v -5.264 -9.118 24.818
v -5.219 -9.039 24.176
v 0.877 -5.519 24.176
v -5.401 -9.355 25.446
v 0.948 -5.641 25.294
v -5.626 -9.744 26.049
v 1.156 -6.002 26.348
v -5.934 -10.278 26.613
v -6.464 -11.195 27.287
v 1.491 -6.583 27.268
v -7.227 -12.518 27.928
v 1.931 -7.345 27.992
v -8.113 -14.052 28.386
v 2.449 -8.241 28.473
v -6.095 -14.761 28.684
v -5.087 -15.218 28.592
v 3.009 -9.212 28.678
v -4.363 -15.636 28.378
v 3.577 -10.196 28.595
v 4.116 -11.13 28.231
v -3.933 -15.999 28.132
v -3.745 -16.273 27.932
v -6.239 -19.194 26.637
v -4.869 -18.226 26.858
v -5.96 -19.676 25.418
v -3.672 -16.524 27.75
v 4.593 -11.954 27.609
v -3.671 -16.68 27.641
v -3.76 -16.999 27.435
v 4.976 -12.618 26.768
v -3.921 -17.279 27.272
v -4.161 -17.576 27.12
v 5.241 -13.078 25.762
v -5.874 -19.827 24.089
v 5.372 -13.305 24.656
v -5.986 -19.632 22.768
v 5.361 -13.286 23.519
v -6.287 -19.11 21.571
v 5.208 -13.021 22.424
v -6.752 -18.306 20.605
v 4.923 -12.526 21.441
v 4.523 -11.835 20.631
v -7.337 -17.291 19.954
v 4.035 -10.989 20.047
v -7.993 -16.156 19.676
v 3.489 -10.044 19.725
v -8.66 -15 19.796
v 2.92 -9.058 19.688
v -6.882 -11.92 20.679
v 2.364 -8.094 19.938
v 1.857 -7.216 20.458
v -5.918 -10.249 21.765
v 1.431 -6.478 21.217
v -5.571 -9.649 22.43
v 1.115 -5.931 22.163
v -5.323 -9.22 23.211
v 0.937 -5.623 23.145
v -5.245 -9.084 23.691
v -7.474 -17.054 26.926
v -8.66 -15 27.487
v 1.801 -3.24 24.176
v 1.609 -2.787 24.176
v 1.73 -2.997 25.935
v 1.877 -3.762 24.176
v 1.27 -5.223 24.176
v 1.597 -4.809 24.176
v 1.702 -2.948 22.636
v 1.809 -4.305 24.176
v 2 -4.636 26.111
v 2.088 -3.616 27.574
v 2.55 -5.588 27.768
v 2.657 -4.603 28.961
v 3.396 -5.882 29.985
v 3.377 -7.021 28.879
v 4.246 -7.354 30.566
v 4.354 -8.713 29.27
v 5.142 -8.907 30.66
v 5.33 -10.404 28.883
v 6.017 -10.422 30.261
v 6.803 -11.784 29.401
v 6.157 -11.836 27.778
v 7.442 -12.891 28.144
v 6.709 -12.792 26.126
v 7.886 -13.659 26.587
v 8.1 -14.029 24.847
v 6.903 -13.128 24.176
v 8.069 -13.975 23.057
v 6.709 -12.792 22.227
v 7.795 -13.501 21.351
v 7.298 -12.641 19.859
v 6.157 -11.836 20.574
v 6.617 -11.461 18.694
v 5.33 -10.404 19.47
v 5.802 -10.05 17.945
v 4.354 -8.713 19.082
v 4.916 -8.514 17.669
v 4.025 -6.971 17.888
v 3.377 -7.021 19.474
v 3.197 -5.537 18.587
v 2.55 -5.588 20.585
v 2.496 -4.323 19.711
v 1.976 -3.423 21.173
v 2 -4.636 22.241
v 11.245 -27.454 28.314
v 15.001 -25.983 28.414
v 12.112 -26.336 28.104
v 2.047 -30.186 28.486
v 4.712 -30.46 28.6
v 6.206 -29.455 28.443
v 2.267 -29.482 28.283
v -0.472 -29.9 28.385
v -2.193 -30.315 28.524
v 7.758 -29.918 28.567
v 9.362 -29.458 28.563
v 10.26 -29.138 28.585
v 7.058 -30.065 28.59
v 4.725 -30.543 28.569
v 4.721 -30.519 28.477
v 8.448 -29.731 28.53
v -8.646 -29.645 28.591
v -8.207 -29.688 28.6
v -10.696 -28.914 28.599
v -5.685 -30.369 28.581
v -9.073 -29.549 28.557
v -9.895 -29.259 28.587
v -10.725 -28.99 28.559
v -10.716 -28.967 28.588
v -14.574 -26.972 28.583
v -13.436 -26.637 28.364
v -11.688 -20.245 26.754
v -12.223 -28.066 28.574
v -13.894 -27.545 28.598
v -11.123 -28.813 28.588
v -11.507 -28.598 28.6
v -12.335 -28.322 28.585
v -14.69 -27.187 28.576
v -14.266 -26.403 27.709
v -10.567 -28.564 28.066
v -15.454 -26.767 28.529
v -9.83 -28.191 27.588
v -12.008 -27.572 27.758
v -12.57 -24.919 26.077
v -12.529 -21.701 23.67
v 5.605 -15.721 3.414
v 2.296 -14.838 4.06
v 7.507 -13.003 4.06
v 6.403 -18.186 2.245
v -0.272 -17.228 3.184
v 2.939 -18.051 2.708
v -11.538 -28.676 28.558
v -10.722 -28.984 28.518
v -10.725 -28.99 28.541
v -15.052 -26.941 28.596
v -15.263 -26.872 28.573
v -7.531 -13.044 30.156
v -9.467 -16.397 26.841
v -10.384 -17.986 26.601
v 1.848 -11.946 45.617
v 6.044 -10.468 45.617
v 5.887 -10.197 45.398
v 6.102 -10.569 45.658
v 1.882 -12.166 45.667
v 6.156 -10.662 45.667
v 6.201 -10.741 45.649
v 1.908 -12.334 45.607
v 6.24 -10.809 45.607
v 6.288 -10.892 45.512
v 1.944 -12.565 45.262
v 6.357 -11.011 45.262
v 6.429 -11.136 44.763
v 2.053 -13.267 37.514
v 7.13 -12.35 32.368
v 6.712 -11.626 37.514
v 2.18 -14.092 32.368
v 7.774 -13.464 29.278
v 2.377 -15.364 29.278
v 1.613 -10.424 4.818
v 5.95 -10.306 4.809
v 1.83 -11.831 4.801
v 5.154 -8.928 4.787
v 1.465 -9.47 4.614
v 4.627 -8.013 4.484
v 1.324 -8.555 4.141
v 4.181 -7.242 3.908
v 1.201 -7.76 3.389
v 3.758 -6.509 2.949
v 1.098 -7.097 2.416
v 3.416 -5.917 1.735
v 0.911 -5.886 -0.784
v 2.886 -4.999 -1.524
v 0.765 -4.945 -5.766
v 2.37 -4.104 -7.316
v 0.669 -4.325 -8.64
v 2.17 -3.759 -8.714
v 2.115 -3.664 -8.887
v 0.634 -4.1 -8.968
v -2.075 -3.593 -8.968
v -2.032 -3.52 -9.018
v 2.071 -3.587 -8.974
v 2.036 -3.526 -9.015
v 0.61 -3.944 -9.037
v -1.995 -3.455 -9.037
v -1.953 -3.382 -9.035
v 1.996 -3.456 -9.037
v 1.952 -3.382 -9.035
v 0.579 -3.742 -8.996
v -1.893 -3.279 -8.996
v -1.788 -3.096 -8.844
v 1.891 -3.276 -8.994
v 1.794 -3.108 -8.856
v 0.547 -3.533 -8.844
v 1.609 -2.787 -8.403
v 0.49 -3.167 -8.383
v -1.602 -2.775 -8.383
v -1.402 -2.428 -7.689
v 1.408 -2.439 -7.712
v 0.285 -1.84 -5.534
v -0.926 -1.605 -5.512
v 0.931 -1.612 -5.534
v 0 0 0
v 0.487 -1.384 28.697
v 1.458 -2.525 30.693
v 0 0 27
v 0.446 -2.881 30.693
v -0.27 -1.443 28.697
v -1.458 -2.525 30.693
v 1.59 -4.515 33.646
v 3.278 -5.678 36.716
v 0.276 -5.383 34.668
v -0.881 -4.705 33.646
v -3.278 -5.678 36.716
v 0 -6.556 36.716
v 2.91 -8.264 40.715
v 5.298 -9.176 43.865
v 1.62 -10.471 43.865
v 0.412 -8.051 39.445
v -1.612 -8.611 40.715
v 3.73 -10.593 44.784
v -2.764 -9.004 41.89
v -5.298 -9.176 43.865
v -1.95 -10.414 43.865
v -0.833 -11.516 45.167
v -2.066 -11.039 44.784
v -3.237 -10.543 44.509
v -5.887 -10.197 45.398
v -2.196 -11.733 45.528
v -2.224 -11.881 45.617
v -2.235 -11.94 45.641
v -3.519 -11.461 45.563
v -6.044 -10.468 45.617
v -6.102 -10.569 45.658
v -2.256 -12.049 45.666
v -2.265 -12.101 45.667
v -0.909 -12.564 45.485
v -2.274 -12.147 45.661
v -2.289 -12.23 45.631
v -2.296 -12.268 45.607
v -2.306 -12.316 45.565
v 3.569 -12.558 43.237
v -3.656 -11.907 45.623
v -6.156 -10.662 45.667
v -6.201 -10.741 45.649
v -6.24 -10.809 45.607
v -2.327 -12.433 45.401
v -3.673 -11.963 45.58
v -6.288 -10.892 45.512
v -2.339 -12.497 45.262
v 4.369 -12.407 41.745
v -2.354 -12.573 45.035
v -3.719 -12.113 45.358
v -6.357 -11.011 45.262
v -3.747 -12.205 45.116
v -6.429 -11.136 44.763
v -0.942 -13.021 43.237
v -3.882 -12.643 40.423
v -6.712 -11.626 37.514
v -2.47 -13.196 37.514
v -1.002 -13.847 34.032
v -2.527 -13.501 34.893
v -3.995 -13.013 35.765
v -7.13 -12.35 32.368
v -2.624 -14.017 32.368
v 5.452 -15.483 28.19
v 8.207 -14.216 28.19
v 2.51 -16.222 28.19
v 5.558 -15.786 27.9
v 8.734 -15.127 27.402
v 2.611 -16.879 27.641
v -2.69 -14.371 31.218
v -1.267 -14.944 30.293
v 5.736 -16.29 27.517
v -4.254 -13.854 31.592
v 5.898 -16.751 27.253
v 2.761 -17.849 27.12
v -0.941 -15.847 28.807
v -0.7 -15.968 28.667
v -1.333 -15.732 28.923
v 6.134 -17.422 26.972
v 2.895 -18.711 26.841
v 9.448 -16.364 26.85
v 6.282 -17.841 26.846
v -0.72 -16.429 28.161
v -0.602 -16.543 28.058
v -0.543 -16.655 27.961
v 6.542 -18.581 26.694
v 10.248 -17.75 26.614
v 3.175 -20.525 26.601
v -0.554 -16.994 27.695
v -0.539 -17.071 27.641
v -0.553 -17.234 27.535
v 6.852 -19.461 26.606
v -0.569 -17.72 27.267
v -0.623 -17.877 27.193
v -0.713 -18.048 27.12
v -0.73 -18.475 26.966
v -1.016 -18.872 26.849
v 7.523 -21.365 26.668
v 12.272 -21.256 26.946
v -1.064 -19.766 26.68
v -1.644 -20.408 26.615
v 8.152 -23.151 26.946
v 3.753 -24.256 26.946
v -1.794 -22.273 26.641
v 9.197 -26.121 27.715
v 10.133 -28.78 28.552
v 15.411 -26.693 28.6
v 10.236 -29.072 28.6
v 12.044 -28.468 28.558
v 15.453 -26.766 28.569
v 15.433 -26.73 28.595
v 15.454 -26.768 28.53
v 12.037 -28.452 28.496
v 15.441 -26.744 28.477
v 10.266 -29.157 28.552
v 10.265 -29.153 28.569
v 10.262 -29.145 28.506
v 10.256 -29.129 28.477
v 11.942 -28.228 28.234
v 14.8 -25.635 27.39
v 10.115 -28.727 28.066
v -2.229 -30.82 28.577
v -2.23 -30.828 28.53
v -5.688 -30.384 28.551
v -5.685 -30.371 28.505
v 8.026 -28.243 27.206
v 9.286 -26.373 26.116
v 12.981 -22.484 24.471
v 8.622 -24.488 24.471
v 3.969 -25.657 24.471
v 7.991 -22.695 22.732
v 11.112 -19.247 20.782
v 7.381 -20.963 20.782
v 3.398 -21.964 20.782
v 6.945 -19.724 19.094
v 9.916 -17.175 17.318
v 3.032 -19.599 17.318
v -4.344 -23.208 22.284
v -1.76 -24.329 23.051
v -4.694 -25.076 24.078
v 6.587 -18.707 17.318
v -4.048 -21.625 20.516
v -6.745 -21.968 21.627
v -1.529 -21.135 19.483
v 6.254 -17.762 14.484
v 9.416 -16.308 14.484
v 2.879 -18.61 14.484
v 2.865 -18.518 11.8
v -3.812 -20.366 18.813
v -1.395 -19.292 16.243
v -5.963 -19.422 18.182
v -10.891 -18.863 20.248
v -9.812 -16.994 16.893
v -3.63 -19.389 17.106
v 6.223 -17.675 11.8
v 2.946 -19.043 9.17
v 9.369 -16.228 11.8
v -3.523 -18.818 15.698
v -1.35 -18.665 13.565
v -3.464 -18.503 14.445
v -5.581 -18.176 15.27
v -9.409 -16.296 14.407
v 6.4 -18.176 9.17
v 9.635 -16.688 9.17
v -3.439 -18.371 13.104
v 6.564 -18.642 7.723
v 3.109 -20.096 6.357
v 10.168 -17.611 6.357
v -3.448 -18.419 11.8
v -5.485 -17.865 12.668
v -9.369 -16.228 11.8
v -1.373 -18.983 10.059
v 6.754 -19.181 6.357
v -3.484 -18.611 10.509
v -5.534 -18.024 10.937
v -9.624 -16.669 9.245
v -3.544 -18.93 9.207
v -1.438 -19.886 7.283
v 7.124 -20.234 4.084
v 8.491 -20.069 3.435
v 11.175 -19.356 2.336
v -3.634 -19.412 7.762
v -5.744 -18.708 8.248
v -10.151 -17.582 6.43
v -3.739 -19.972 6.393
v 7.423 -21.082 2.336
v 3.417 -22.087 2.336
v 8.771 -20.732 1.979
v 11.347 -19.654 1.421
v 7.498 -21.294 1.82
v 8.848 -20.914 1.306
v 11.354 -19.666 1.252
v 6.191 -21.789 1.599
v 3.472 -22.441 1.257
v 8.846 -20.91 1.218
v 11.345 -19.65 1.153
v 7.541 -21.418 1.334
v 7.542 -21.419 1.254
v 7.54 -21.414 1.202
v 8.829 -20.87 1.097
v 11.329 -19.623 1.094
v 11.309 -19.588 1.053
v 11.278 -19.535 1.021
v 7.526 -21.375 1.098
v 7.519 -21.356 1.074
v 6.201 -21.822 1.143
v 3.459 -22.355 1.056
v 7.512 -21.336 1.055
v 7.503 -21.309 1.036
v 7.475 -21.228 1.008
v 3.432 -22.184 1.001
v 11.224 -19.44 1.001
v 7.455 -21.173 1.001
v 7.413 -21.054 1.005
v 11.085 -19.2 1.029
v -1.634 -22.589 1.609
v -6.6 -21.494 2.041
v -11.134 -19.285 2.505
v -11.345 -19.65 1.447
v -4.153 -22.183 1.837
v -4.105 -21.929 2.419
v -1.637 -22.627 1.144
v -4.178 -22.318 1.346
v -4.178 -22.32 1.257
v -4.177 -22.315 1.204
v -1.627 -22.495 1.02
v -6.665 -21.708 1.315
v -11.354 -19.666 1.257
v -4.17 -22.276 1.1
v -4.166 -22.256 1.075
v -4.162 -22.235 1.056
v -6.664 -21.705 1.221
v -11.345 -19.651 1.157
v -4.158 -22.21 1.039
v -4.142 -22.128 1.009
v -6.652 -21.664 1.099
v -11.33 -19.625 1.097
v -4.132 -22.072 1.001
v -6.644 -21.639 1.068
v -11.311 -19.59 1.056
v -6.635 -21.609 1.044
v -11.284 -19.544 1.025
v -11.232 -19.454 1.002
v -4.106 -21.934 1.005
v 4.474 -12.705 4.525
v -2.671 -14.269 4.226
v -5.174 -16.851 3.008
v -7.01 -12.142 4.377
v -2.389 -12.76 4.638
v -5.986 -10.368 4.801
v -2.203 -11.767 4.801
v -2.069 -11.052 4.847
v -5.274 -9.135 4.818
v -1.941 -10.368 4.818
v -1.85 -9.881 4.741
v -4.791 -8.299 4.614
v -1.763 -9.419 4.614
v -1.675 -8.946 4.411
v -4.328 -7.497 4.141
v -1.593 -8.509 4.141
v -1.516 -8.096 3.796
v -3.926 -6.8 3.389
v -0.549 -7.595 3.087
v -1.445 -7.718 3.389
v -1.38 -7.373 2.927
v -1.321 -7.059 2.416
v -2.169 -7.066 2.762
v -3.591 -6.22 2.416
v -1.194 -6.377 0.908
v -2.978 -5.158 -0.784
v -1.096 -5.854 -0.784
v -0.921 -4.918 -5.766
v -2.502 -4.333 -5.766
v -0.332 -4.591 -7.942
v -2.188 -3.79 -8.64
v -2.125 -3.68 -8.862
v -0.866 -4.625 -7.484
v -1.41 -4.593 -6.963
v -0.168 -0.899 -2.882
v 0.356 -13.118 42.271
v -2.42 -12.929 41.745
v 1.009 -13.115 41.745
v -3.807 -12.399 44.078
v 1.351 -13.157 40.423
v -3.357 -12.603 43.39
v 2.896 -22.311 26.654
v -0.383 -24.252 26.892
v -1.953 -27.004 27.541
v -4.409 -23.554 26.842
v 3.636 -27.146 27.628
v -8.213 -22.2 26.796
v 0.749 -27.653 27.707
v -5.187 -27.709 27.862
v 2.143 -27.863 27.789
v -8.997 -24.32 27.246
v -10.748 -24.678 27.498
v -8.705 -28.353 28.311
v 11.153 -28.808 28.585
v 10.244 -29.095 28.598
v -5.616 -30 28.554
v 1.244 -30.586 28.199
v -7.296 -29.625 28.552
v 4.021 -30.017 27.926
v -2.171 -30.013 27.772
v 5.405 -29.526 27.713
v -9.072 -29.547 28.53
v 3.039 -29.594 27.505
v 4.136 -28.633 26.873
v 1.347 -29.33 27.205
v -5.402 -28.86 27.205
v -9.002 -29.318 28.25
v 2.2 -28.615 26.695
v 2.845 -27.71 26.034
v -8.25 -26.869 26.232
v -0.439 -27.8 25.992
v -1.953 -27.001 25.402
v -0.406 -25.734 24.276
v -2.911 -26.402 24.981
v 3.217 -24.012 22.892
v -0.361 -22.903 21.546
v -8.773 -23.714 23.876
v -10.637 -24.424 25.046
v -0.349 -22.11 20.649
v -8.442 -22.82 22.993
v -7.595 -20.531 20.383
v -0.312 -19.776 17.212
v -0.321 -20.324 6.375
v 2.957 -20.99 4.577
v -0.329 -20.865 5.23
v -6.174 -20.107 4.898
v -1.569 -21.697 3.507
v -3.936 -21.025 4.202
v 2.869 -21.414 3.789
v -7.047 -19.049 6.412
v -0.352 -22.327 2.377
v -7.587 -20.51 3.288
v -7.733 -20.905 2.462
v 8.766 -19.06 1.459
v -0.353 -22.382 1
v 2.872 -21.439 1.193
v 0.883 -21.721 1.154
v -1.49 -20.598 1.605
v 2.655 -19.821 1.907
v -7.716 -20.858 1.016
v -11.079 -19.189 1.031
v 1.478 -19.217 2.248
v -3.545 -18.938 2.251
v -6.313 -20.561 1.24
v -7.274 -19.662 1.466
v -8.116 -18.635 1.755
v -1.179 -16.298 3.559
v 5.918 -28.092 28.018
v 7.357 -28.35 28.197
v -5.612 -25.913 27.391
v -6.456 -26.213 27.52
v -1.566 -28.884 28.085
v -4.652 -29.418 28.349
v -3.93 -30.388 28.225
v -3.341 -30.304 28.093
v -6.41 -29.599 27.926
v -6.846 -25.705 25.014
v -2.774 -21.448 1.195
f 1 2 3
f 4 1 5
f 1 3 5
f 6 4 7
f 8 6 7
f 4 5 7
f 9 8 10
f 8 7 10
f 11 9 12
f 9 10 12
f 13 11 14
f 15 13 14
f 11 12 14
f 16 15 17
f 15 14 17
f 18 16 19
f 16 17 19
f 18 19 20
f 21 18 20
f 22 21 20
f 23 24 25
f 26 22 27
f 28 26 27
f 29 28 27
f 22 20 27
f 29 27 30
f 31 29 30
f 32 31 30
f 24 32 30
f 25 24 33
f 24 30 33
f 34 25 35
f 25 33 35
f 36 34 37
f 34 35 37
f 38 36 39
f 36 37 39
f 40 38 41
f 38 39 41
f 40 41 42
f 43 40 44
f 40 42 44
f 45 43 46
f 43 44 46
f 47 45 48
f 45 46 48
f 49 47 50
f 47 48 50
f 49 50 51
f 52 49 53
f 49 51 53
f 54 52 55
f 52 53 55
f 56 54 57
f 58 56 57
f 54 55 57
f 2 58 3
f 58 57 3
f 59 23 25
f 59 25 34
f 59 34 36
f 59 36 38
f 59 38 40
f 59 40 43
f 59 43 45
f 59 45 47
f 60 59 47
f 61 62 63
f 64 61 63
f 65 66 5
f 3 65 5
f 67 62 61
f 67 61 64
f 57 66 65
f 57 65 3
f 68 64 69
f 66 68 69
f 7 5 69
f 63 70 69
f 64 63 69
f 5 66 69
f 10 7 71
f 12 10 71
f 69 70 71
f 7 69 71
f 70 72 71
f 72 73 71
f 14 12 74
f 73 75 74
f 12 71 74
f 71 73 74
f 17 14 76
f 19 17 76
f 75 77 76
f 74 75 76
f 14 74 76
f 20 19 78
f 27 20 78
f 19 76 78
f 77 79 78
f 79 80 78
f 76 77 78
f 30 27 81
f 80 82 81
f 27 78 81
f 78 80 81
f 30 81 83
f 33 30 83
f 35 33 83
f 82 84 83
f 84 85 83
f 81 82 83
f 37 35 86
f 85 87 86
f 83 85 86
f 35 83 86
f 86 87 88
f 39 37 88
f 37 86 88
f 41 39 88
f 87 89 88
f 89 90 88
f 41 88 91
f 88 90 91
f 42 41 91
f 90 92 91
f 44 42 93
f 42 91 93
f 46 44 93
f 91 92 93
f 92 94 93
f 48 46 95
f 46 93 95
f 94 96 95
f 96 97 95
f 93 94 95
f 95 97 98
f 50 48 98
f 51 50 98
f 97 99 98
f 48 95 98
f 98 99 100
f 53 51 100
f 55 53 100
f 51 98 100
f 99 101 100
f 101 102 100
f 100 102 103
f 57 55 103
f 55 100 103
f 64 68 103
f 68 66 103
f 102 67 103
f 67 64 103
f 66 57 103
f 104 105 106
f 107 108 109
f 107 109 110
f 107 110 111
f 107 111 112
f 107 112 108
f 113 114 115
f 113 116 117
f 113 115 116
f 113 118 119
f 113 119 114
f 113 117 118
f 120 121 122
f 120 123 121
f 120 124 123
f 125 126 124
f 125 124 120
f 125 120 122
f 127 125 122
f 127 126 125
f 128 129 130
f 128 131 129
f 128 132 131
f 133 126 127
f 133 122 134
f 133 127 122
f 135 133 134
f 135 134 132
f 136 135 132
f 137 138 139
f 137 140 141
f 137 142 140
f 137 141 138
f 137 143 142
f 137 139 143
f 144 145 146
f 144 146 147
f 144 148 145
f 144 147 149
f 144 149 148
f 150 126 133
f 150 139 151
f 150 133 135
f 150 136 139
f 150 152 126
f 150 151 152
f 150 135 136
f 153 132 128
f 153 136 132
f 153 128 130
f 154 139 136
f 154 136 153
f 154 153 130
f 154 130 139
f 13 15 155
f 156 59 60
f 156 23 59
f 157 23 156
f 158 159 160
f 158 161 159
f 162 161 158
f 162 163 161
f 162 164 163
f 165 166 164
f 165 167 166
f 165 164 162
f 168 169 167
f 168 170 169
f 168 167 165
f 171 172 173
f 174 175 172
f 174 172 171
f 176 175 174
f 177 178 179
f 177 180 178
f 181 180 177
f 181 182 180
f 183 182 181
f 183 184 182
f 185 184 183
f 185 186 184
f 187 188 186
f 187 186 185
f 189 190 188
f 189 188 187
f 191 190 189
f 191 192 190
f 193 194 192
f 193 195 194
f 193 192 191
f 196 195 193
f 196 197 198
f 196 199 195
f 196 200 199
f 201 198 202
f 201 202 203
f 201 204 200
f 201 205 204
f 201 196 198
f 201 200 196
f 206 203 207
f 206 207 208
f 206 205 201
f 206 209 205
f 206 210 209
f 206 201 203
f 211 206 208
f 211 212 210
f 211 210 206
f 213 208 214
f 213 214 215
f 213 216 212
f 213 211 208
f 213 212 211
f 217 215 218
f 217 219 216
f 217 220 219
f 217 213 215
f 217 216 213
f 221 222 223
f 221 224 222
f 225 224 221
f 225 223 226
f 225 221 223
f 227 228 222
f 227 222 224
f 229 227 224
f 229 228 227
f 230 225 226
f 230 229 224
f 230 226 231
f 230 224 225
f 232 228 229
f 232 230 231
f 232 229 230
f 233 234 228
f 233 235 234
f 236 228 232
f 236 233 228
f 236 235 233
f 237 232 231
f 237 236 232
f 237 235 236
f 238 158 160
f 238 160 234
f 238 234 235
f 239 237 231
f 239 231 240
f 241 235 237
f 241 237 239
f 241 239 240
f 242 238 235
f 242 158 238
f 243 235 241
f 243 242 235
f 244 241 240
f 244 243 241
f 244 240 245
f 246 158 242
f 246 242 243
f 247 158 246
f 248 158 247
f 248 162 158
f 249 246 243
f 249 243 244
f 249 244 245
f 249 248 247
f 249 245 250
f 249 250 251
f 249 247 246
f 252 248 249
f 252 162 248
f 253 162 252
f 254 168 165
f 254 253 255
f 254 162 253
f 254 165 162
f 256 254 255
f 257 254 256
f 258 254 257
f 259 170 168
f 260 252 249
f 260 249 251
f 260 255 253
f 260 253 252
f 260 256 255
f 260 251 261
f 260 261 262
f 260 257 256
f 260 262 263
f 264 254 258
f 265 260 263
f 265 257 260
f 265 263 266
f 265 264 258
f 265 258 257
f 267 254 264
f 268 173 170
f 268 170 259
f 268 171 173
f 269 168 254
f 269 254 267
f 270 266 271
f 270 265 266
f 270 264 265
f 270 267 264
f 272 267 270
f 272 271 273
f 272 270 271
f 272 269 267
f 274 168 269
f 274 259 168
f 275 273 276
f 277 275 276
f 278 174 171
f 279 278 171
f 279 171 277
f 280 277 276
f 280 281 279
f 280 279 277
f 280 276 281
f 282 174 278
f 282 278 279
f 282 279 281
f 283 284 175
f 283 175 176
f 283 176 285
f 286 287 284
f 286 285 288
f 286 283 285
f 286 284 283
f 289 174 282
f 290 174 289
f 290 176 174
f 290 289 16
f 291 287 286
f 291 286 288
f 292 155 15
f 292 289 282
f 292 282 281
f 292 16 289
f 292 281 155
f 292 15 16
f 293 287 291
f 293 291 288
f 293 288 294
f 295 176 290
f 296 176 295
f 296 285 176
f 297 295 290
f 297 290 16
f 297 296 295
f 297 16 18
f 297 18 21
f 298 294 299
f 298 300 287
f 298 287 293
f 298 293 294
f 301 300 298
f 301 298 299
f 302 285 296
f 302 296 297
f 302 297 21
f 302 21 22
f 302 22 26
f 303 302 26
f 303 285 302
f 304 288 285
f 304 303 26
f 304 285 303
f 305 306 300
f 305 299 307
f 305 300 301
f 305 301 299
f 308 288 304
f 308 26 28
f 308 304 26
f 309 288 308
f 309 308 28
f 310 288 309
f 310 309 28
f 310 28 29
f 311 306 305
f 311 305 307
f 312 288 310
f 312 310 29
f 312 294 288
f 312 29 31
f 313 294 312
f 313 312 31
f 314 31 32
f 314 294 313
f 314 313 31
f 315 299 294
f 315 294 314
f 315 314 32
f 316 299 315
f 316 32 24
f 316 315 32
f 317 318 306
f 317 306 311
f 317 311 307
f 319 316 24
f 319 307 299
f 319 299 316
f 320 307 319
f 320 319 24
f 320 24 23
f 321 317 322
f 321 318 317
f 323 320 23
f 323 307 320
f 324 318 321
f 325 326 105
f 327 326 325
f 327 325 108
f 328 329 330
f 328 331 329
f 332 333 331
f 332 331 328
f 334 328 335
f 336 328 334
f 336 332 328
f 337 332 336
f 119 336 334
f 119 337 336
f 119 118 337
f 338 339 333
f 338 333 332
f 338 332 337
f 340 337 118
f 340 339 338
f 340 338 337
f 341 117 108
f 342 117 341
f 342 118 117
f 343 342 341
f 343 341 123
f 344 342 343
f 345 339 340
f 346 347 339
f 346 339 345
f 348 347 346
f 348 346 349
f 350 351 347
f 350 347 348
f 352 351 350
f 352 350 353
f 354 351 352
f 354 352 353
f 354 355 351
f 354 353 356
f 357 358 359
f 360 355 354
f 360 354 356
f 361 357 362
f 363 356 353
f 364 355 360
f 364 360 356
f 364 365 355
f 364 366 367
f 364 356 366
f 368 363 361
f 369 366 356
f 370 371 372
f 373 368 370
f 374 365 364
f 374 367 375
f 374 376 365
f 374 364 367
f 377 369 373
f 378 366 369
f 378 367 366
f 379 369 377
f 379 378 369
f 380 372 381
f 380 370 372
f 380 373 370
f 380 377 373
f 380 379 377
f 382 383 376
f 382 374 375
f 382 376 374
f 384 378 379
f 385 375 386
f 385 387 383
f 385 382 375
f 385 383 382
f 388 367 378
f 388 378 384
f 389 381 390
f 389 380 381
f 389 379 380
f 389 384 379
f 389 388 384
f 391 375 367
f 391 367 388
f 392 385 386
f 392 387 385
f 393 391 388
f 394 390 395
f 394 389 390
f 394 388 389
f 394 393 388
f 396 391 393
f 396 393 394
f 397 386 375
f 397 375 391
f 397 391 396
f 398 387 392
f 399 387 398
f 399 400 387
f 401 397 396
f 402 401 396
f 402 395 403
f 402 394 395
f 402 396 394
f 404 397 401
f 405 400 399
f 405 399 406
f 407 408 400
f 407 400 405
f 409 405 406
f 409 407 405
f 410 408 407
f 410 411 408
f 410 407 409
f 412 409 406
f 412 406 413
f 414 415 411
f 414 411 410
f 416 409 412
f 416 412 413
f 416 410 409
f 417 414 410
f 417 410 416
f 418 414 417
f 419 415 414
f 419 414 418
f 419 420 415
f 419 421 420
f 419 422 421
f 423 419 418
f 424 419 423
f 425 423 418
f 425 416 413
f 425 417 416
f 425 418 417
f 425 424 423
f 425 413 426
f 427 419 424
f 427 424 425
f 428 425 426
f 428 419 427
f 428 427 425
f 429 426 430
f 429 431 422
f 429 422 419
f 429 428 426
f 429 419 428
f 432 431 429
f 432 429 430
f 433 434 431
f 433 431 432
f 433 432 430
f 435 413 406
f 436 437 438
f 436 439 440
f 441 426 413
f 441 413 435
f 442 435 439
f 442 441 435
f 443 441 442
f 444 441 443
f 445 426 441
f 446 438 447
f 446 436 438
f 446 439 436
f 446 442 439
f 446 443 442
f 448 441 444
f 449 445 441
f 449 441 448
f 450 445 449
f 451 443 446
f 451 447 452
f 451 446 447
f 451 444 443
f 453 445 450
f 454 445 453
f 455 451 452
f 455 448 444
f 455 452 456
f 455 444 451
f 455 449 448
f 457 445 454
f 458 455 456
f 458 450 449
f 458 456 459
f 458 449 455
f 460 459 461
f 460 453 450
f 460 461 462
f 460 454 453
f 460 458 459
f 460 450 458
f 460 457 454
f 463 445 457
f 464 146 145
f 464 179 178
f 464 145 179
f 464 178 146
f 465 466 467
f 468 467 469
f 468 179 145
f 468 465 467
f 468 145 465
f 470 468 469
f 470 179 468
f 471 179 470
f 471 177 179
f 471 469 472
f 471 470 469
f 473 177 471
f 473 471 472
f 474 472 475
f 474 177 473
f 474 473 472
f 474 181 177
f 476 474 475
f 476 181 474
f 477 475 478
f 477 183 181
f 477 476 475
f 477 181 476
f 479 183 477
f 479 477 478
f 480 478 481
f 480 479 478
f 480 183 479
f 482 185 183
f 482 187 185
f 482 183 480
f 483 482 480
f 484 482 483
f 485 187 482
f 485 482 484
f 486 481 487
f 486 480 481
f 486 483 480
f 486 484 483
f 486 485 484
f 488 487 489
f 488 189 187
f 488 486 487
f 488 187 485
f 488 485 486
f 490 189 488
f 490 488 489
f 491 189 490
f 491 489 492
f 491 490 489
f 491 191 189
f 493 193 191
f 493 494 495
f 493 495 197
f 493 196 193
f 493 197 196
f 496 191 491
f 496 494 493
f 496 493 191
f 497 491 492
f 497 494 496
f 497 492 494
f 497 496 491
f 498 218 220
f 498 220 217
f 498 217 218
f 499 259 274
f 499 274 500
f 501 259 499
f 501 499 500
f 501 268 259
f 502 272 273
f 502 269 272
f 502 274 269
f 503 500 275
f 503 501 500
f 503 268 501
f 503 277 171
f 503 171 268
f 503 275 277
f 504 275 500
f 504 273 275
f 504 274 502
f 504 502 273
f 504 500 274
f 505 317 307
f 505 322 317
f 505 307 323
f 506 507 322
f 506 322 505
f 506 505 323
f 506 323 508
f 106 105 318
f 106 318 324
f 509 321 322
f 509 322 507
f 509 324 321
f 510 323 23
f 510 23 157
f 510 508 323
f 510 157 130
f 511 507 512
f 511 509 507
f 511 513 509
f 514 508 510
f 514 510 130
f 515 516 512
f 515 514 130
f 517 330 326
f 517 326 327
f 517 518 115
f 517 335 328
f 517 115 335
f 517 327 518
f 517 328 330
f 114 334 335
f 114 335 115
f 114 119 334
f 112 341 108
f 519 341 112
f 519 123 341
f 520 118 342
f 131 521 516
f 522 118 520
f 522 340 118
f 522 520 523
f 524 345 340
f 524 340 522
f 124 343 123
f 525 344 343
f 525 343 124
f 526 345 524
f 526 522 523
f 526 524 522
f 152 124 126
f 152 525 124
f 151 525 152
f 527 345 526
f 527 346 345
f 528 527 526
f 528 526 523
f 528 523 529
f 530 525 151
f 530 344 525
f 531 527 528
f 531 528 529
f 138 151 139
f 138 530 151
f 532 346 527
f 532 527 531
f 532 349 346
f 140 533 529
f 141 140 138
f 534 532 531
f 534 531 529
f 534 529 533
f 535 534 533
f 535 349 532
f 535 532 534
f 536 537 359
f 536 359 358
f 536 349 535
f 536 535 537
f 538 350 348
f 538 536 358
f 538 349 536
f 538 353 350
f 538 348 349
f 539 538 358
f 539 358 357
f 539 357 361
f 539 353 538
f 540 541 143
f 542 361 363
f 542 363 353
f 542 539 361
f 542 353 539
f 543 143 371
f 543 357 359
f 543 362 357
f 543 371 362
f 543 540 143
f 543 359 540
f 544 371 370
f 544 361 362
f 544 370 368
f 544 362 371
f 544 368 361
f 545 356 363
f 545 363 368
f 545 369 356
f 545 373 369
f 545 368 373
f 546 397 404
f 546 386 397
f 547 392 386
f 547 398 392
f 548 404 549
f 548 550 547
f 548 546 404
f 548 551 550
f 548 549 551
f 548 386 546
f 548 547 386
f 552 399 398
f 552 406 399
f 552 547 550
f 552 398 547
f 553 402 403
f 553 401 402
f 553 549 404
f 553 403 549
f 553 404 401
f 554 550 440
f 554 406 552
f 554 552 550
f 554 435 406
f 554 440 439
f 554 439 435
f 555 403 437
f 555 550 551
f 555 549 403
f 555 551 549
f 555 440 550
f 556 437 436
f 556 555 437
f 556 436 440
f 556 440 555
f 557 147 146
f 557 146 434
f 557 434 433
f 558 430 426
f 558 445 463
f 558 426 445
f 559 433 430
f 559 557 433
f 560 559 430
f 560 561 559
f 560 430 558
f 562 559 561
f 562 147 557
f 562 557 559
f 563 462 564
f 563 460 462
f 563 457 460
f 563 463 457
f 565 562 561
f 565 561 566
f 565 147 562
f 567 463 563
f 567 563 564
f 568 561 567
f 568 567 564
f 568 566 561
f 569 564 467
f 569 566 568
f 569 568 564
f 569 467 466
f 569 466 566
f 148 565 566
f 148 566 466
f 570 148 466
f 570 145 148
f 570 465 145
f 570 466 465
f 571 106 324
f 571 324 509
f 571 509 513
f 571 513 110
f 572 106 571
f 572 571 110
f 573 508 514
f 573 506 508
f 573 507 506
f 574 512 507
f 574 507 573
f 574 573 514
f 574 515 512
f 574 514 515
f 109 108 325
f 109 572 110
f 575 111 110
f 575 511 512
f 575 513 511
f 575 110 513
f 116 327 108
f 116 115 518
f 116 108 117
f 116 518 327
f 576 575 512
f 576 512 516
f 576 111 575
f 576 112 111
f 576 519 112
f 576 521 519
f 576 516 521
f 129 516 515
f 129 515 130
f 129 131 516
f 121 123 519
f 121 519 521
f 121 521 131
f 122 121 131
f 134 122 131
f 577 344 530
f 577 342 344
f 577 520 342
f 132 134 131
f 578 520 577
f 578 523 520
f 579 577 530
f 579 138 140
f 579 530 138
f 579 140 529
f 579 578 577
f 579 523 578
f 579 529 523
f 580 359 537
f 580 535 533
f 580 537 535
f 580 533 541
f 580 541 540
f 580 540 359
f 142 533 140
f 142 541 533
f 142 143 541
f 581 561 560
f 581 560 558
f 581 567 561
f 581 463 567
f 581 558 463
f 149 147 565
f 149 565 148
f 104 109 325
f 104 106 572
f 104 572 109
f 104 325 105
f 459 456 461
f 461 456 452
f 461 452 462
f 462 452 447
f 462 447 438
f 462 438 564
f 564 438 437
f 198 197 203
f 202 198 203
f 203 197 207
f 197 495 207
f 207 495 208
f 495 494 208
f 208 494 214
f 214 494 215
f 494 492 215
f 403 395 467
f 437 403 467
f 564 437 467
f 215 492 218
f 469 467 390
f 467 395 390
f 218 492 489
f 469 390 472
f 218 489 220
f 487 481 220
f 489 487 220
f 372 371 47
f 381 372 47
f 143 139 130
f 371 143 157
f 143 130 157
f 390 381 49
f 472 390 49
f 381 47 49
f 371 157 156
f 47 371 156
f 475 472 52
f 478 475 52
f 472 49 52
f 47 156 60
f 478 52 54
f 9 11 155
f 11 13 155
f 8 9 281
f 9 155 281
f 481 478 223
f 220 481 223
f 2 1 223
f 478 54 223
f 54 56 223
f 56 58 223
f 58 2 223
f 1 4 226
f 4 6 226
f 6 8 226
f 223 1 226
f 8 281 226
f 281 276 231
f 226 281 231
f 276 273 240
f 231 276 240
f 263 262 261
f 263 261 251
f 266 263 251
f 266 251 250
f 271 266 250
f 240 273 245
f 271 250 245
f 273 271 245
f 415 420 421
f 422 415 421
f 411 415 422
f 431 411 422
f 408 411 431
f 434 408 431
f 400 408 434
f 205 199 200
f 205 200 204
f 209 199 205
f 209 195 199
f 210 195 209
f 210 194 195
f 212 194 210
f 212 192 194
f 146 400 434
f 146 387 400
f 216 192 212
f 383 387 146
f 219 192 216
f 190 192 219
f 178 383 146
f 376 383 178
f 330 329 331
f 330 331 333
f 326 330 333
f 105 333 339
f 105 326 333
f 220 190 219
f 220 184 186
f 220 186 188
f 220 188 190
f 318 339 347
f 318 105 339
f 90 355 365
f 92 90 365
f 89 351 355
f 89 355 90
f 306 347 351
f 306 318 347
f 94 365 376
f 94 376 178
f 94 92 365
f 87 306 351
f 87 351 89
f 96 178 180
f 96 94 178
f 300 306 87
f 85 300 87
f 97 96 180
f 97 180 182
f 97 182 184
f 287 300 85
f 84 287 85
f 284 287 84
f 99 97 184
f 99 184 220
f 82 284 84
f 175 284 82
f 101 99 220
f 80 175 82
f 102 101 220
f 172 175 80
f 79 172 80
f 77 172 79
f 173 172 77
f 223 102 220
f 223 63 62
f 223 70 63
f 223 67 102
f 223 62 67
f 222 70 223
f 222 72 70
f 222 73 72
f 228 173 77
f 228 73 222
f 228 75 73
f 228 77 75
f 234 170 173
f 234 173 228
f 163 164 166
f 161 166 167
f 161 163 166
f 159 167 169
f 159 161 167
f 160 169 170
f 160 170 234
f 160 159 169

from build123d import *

# Parameters (mm, degrees)
F1_ANGLE_BACK = 30
F1_ANGLE      = 60
F2_R          = 4.5079852031
F3_DEPTH      = 15
F4_R          = 2


with BuildPart() as f1:
    # F0 (on Right) → F1 (revolve)
    with BuildSketch(Plane.YZ, mode=Mode.PRIVATE) as f1_sk:
        with BuildLine():
            Line((0, 0), (0, 27))
            add(Edge.make_bspline(
                [(0, 27), (-5.5034394129, 32.661690712), (-15.8471030498, 59.3621170559), (-10.5280846021, 19.7077828646), (-41.0819364315, 33.8046592086), (-10.5991049383, 16.215764014), (-29.7721432902, -5.3374961203), (-4.7977967218, 12.3670629457), (-5.5203058645, -16.1073831097), (-1.4451971006, -4.7678385339), (0, 0)],
                knots=[0, 0, 0, 0, 0.150530903, 0.287029044, 0.4059261233, 0.5423978305, 0.661868087, 0.7802364409, 0.9001627782, 1, 1, 1, 1], degree=3))
        make_face()
    revolve(f1_sk.sketch.rotate(Axis((0, 0, 13.5), (0, 0, -1)), -F1_ANGLE_BACK), axis=Axis((0, 0, 13.5), (0, 0, -1)), revolution_arc=F1_ANGLE)

    # F2 (on face) → F3 (cut, symmetric)
    with BuildSketch(Plane(origin=(0, 0, 0), x_dir=(-0.5, 0.8660254038, 0), z_dir=(0.8660254038, 0.5, 0))):
        with Locations((-9.7265727818, 24.1762548685)):
            Circle(F2_R)
    extrude(amount=F3_DEPTH, both=True, mode=Mode.SUBTRACT)

    # F4
    f4_edges = [f1.edges().sort_by_distance(p)[0] for p in [
        (7.117279, -12.327489, 24.176255),
    ]]
    fillet(f4_edges, radius=F4_R)


solid = f1.part
